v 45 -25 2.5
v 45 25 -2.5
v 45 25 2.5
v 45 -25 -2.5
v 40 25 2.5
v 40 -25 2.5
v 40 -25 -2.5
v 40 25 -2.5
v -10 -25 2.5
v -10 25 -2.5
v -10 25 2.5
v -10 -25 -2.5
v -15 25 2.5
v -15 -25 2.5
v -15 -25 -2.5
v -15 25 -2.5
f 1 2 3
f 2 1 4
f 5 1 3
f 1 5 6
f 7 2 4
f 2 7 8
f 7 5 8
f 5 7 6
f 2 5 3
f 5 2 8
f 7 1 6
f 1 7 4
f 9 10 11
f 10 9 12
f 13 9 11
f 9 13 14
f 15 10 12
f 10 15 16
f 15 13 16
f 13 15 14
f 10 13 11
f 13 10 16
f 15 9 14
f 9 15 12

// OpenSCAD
// file: ../config/colors.scad
/* RailEduKit/InteractiveSignallingLaboratory © 2025 by Martin Scheidt and contributors
 * License: CC-BY 4.0 - https://creativecommons.org/licenses/by/4.0/
 * Project description: The Interactive Signalling Laboratory is a tool for training in Rail
 * Applications to enhance the knowledge of control and signalling principles for rail transport systems.
 *
 * Module: config/colors.scad
 */


SPRUCE_WOOD = [231/255, 203/255, 172/255]; // Desert Sand by https://www.schemecolor.com/spruce-wood-colors.php

// component colors
BASE_COLOR = [0.25, 0.25, 0.25];// lighter black to see the shapes
INDICATOR_COLOR = "white";
ROUTE_COLOR = [0.255, 0.412, 0.882]; //[0.396, 0.467, 0.702];

METALLIC_GREY = [0.474, 0.482, 0.482];



// signal colors
ASPECT_CLEAR = "green";
ASPECT_APPROACH = "yellow";
ASPECT_STOP = "red";
// main file
/* RailEduKit/InteractiveSignallingLaboratory © 2025 by Martin Scheidt and contributors
 * License: CC-BY 4.0 - https://creativecommons.org/licenses/by/4.0/
 * Project description: The Interactive Signalling Laboratory is a tool for training in Rail
 * Applications to enhance the knowledge of control and signalling principles for rail transport systems.
 *
 * Module: polarity_indicator
 */

// Include configuration file
include <../config/global_variables.scad>
include <../config/colors.scad>

polarity_width = 5;
polarity_height = 5;

polarity_gap = 10;

module polarity_track_straight(){
    color(ASPECT_STOP)
    translate([-polarity_gap-polarity_width,0,0])
    cube([polarity_width, straight_length, polarity_height]);
    color(ASPECT_STOP)
    translate([polarity_gap+rail_width,0,0])
    cube([polarity_width, straight_length, polarity_height]);
}

module polarity_signal_box(){
    color(ASPECT_CLEAR)
    translate([body_width+polarity_width/2+polarity_gap,0,0])
    cube([polarity_width, body_depth, polarity_height], center = true);
    color(ASPECT_STOP)
    translate([-polarity_width/2-polarity_gap,0,0])
    cube([polarity_width, body_depth, polarity_height], center = true);
}


polarity_signal_box();
